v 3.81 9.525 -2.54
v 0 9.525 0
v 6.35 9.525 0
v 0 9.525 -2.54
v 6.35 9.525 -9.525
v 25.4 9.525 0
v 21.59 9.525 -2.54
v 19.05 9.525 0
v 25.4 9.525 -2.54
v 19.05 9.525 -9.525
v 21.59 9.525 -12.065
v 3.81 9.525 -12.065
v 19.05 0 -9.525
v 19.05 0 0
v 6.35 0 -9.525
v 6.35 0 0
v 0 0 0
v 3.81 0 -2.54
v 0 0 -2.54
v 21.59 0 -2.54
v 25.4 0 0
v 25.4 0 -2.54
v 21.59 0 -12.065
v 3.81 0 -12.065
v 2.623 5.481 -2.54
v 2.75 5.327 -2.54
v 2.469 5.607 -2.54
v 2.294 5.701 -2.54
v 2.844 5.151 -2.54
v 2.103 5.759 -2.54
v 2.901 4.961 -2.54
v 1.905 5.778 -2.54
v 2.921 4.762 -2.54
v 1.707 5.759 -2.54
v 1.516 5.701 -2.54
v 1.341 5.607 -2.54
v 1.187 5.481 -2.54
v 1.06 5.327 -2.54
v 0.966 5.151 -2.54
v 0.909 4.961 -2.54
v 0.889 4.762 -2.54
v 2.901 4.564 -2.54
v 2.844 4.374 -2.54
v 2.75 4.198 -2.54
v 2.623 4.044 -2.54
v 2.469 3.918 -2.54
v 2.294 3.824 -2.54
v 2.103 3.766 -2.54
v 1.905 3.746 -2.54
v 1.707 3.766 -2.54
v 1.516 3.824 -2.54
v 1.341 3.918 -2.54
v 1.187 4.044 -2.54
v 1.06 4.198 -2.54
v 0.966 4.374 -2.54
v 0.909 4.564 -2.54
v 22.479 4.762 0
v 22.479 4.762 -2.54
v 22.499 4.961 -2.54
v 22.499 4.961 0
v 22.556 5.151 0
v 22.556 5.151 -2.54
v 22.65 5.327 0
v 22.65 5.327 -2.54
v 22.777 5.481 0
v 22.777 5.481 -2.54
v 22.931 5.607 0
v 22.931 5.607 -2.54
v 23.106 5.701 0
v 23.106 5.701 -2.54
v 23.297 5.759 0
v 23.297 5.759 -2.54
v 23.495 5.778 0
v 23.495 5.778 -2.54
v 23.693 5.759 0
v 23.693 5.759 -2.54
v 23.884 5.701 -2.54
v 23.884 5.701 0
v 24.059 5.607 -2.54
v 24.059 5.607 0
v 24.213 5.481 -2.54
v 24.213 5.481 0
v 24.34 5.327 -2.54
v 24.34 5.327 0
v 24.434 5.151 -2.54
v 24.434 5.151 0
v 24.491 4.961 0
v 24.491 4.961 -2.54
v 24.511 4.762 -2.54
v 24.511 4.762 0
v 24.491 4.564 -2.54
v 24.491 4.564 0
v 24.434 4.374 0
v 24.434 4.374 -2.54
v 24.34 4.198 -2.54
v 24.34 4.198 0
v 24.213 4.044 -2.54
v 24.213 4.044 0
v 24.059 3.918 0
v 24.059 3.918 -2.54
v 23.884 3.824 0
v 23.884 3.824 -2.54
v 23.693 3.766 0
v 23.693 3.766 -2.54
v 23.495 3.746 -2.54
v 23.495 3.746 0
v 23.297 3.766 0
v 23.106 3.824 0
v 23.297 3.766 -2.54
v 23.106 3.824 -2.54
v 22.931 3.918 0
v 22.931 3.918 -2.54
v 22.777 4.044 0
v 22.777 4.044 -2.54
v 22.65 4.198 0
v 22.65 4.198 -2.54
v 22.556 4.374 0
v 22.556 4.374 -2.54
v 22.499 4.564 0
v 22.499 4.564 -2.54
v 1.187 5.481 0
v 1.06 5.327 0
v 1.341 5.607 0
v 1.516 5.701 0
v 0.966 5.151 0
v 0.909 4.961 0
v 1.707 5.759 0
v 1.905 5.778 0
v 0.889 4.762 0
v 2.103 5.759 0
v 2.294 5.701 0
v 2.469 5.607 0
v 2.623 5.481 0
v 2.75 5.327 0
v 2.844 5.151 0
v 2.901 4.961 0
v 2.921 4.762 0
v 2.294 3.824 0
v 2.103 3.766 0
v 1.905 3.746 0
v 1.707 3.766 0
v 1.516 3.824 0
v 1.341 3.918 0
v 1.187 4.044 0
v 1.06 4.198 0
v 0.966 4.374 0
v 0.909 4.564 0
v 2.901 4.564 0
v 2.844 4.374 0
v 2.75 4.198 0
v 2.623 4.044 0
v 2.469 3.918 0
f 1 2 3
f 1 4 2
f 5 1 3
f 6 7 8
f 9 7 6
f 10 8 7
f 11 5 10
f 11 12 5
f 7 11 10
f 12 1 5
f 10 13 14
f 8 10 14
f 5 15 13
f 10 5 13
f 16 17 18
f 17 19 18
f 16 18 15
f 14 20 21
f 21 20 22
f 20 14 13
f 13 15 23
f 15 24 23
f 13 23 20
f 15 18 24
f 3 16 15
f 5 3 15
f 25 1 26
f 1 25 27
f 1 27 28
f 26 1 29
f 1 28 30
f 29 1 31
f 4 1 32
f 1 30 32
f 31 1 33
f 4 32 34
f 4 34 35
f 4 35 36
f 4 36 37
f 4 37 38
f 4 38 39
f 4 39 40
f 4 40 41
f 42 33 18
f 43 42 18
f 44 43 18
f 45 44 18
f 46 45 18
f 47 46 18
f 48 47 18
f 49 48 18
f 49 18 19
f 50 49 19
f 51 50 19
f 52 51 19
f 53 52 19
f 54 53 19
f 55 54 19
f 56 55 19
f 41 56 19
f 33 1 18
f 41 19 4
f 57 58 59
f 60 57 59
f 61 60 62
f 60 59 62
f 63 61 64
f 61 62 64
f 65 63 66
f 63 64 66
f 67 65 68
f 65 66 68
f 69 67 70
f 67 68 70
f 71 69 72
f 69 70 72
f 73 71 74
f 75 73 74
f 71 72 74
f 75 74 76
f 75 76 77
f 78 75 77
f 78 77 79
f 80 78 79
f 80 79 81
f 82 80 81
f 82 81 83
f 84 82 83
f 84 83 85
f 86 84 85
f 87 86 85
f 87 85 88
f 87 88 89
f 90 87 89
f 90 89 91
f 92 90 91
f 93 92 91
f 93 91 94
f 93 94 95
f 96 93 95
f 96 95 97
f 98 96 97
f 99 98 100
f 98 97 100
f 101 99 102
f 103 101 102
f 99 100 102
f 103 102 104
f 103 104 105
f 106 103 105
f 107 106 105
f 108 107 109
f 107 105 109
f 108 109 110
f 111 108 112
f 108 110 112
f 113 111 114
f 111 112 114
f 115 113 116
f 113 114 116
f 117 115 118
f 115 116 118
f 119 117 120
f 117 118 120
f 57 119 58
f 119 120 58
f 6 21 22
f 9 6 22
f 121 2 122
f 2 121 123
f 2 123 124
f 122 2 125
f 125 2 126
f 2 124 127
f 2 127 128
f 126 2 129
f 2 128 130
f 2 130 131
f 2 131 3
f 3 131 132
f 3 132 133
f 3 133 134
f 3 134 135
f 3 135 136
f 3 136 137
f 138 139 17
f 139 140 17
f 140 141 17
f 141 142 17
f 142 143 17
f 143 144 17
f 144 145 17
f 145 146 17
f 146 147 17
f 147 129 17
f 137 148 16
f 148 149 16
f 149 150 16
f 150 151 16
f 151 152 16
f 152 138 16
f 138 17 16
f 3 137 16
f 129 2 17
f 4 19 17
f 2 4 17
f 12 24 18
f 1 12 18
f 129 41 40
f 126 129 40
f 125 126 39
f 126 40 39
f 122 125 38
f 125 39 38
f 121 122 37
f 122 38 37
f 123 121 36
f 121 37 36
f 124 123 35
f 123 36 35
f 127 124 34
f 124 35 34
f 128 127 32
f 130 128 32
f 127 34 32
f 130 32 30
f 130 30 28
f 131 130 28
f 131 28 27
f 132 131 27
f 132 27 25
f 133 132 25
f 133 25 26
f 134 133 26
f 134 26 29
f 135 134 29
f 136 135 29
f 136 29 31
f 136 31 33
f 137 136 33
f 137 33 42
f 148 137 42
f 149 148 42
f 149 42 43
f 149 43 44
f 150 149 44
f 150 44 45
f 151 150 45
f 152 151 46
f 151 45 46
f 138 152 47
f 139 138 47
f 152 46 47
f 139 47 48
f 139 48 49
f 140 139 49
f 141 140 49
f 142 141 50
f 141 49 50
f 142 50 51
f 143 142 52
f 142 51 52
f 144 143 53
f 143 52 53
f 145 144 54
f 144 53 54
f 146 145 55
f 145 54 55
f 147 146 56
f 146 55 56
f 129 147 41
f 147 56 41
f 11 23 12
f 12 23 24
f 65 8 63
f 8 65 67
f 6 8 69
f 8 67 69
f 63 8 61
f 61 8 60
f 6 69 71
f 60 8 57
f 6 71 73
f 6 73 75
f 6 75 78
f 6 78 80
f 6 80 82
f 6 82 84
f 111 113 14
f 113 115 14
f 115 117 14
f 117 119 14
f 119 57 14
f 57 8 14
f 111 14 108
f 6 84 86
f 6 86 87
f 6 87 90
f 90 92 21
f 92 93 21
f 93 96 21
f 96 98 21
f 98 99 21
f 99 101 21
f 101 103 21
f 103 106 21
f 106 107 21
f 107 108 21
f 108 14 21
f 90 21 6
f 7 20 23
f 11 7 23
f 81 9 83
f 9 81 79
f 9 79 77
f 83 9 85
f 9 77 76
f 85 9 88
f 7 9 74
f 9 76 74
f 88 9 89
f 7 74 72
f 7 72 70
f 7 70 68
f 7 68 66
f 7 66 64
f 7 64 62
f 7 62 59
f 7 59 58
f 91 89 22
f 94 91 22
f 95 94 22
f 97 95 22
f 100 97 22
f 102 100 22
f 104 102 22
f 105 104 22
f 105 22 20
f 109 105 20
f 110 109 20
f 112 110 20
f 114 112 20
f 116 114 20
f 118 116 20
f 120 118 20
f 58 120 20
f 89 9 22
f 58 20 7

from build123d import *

# Parameters (mm, degrees)
BOSS_EXTRUDE1_DEPTH = 9.525
CUT_EXTRUDE1_REACH  = 4.54
SKETCH2_R           = 1.016


with BuildPart() as part:
    # Sketch1 → Boss-Extrude1 (new body)
    with BuildSketch(Plane(origin=(0, 0, 0), x_dir=(1, 0, 0), z_dir=(0, 1, 0))):
        Polygon((0, 0), (6.35, 0), (6.35, 9.525), (19.05, 9.525), (19.05, 0), (25.4, 0), (25.4, 2.54), (21.59, 2.54), (21.59, 12.065), (3.81, 12.065), (3.81, 2.54), (0, 2.54), align=None)
    extrude(amount=BOSS_EXTRUDE1_DEPTH)

    # Sketch2 → Cut-Extrude1 (cut, up to next)
    with BuildSketch(Plane(origin=(0, 0, -2.54), x_dir=(-1, 0, 0), z_dir=(0, 0, -1)), mode=Mode.PRIVATE) as cut_extrude1_sk1:
        with Locations((-1.905, 4.7625)):
            Circle(SKETCH2_R)
    cut_extrude1_tool1 = extrude(cut_extrude1_sk1.sketch, amount=-CUT_EXTRUDE1_REACH, mode=Mode.PRIVATE) & part.part
    add(cut_extrude1_tool1.solids().sort_by_distance((1.905, 4.7625, -2.54))[0], mode=Mode.SUBTRACT)
    # Sketch2 → Cut-Extrude1 (cut, up to next)
    with BuildSketch(Plane(origin=(0, 0, -2.54), x_dir=(-1, 0, 0), z_dir=(0, 0, -1)), mode=Mode.PRIVATE) as cut_extrude1_sk2:
        with Locations((-23.495, 4.7625)):
            Circle(SKETCH2_R)
    cut_extrude1_tool2 = extrude(cut_extrude1_sk2.sketch, amount=-CUT_EXTRUDE1_REACH, mode=Mode.PRIVATE) & part.part
    add(cut_extrude1_tool2.solids().sort_by_distance((23.495, 4.7625, -2.54))[0], mode=Mode.SUBTRACT)


solid = part.part
